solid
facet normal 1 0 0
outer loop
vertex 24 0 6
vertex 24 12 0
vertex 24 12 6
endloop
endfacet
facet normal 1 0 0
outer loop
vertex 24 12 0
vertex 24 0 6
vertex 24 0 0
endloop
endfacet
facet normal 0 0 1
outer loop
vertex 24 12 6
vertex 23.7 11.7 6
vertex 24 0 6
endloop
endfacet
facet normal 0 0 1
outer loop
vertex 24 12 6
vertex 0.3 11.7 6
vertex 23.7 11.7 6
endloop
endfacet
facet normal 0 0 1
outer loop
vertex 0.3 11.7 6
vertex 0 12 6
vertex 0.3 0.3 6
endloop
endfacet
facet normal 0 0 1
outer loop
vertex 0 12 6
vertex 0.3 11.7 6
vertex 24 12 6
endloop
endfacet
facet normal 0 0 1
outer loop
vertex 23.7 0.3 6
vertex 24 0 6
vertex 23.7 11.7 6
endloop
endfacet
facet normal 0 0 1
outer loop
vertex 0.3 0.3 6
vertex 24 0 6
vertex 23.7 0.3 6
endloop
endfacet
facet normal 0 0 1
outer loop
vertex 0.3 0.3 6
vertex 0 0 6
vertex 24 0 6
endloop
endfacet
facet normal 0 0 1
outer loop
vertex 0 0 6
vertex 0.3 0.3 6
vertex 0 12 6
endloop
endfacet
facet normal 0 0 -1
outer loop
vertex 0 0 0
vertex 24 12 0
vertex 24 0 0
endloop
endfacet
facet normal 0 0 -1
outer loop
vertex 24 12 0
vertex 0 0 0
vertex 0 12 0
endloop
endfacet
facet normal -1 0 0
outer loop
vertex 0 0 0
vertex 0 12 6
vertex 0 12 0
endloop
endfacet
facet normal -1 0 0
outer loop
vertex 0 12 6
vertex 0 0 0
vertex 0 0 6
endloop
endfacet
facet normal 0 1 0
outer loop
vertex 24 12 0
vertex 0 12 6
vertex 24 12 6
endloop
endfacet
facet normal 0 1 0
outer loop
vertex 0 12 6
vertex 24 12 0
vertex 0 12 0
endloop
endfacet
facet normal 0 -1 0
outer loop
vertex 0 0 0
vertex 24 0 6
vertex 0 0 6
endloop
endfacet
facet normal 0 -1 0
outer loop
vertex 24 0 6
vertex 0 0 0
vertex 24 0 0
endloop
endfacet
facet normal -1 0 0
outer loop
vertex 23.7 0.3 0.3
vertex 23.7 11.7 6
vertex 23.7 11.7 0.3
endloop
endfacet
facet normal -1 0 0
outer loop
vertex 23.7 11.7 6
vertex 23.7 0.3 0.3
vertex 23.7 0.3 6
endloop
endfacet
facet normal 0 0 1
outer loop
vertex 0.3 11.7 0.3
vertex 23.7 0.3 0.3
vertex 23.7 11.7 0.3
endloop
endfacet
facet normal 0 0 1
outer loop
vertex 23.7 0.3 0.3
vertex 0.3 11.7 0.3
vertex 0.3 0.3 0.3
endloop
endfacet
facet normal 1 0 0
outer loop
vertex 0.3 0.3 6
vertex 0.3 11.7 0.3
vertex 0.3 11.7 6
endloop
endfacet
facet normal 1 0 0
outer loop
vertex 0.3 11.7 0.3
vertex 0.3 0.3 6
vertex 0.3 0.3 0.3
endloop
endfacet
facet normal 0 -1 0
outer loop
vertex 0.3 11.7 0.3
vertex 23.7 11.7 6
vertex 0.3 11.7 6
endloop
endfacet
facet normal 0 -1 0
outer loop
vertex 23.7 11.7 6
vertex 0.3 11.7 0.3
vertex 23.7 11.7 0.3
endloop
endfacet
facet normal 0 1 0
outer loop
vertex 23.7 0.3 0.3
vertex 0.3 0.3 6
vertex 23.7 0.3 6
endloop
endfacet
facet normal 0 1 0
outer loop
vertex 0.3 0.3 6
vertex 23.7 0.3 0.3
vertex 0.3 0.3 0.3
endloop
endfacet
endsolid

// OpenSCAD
base_width = 12;
thickness = base_width*0.025;

difference() { 
  cube([base_width*2,base_width,base_width/2]);
  translate(v=[thickness,thickness,thickness]) {
     cube([
       base_width*2 - thickness*2,
       base_width - thickness*2,
       base_width/2 - thickness]);
  }
}
